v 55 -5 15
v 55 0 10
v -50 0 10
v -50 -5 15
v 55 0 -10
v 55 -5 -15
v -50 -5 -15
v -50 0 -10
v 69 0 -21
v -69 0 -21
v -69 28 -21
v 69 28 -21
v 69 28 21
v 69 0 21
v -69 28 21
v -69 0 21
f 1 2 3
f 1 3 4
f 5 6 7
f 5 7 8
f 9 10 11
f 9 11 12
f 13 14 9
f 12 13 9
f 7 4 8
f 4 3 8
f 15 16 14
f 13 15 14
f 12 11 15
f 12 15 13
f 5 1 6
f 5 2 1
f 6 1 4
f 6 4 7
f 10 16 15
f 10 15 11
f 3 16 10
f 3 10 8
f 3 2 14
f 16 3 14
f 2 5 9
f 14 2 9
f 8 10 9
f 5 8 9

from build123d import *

# Parameters (mm, degrees)
SKETCH1_W           = 138
SKETCH1_H           = 42
BOSS_EXTRUDE1_DEPTH = 28
BOSS_EXTRUDE2_START = -14
BOSS_EXTRUDE2_DEPTH = 105


with BuildPart() as part:
    # Sketch1 → Boss-Extrude1 (new body)
    with BuildSketch(Plane(origin=(0, 0, 0), x_dir=(1, 0, 0), z_dir=(0, 1, 0))):
        Rectangle(SKETCH1_W, SKETCH1_H)
    extrude(amount=BOSS_EXTRUDE1_DEPTH)

    # Sketch3 → Boss-Extrude2 (add)
    with BuildSketch(Plane(origin=(69, 0, 0), x_dir=(0, 0, -1), z_dir=(1, 0, 0)).offset(BOSS_EXTRUDE2_START)):
        Polygon((-15, -5), (15, -5), (10, 0), (-10, 0), align=None)
    extrude(amount=-BOSS_EXTRUDE2_DEPTH)


solid = part.part
